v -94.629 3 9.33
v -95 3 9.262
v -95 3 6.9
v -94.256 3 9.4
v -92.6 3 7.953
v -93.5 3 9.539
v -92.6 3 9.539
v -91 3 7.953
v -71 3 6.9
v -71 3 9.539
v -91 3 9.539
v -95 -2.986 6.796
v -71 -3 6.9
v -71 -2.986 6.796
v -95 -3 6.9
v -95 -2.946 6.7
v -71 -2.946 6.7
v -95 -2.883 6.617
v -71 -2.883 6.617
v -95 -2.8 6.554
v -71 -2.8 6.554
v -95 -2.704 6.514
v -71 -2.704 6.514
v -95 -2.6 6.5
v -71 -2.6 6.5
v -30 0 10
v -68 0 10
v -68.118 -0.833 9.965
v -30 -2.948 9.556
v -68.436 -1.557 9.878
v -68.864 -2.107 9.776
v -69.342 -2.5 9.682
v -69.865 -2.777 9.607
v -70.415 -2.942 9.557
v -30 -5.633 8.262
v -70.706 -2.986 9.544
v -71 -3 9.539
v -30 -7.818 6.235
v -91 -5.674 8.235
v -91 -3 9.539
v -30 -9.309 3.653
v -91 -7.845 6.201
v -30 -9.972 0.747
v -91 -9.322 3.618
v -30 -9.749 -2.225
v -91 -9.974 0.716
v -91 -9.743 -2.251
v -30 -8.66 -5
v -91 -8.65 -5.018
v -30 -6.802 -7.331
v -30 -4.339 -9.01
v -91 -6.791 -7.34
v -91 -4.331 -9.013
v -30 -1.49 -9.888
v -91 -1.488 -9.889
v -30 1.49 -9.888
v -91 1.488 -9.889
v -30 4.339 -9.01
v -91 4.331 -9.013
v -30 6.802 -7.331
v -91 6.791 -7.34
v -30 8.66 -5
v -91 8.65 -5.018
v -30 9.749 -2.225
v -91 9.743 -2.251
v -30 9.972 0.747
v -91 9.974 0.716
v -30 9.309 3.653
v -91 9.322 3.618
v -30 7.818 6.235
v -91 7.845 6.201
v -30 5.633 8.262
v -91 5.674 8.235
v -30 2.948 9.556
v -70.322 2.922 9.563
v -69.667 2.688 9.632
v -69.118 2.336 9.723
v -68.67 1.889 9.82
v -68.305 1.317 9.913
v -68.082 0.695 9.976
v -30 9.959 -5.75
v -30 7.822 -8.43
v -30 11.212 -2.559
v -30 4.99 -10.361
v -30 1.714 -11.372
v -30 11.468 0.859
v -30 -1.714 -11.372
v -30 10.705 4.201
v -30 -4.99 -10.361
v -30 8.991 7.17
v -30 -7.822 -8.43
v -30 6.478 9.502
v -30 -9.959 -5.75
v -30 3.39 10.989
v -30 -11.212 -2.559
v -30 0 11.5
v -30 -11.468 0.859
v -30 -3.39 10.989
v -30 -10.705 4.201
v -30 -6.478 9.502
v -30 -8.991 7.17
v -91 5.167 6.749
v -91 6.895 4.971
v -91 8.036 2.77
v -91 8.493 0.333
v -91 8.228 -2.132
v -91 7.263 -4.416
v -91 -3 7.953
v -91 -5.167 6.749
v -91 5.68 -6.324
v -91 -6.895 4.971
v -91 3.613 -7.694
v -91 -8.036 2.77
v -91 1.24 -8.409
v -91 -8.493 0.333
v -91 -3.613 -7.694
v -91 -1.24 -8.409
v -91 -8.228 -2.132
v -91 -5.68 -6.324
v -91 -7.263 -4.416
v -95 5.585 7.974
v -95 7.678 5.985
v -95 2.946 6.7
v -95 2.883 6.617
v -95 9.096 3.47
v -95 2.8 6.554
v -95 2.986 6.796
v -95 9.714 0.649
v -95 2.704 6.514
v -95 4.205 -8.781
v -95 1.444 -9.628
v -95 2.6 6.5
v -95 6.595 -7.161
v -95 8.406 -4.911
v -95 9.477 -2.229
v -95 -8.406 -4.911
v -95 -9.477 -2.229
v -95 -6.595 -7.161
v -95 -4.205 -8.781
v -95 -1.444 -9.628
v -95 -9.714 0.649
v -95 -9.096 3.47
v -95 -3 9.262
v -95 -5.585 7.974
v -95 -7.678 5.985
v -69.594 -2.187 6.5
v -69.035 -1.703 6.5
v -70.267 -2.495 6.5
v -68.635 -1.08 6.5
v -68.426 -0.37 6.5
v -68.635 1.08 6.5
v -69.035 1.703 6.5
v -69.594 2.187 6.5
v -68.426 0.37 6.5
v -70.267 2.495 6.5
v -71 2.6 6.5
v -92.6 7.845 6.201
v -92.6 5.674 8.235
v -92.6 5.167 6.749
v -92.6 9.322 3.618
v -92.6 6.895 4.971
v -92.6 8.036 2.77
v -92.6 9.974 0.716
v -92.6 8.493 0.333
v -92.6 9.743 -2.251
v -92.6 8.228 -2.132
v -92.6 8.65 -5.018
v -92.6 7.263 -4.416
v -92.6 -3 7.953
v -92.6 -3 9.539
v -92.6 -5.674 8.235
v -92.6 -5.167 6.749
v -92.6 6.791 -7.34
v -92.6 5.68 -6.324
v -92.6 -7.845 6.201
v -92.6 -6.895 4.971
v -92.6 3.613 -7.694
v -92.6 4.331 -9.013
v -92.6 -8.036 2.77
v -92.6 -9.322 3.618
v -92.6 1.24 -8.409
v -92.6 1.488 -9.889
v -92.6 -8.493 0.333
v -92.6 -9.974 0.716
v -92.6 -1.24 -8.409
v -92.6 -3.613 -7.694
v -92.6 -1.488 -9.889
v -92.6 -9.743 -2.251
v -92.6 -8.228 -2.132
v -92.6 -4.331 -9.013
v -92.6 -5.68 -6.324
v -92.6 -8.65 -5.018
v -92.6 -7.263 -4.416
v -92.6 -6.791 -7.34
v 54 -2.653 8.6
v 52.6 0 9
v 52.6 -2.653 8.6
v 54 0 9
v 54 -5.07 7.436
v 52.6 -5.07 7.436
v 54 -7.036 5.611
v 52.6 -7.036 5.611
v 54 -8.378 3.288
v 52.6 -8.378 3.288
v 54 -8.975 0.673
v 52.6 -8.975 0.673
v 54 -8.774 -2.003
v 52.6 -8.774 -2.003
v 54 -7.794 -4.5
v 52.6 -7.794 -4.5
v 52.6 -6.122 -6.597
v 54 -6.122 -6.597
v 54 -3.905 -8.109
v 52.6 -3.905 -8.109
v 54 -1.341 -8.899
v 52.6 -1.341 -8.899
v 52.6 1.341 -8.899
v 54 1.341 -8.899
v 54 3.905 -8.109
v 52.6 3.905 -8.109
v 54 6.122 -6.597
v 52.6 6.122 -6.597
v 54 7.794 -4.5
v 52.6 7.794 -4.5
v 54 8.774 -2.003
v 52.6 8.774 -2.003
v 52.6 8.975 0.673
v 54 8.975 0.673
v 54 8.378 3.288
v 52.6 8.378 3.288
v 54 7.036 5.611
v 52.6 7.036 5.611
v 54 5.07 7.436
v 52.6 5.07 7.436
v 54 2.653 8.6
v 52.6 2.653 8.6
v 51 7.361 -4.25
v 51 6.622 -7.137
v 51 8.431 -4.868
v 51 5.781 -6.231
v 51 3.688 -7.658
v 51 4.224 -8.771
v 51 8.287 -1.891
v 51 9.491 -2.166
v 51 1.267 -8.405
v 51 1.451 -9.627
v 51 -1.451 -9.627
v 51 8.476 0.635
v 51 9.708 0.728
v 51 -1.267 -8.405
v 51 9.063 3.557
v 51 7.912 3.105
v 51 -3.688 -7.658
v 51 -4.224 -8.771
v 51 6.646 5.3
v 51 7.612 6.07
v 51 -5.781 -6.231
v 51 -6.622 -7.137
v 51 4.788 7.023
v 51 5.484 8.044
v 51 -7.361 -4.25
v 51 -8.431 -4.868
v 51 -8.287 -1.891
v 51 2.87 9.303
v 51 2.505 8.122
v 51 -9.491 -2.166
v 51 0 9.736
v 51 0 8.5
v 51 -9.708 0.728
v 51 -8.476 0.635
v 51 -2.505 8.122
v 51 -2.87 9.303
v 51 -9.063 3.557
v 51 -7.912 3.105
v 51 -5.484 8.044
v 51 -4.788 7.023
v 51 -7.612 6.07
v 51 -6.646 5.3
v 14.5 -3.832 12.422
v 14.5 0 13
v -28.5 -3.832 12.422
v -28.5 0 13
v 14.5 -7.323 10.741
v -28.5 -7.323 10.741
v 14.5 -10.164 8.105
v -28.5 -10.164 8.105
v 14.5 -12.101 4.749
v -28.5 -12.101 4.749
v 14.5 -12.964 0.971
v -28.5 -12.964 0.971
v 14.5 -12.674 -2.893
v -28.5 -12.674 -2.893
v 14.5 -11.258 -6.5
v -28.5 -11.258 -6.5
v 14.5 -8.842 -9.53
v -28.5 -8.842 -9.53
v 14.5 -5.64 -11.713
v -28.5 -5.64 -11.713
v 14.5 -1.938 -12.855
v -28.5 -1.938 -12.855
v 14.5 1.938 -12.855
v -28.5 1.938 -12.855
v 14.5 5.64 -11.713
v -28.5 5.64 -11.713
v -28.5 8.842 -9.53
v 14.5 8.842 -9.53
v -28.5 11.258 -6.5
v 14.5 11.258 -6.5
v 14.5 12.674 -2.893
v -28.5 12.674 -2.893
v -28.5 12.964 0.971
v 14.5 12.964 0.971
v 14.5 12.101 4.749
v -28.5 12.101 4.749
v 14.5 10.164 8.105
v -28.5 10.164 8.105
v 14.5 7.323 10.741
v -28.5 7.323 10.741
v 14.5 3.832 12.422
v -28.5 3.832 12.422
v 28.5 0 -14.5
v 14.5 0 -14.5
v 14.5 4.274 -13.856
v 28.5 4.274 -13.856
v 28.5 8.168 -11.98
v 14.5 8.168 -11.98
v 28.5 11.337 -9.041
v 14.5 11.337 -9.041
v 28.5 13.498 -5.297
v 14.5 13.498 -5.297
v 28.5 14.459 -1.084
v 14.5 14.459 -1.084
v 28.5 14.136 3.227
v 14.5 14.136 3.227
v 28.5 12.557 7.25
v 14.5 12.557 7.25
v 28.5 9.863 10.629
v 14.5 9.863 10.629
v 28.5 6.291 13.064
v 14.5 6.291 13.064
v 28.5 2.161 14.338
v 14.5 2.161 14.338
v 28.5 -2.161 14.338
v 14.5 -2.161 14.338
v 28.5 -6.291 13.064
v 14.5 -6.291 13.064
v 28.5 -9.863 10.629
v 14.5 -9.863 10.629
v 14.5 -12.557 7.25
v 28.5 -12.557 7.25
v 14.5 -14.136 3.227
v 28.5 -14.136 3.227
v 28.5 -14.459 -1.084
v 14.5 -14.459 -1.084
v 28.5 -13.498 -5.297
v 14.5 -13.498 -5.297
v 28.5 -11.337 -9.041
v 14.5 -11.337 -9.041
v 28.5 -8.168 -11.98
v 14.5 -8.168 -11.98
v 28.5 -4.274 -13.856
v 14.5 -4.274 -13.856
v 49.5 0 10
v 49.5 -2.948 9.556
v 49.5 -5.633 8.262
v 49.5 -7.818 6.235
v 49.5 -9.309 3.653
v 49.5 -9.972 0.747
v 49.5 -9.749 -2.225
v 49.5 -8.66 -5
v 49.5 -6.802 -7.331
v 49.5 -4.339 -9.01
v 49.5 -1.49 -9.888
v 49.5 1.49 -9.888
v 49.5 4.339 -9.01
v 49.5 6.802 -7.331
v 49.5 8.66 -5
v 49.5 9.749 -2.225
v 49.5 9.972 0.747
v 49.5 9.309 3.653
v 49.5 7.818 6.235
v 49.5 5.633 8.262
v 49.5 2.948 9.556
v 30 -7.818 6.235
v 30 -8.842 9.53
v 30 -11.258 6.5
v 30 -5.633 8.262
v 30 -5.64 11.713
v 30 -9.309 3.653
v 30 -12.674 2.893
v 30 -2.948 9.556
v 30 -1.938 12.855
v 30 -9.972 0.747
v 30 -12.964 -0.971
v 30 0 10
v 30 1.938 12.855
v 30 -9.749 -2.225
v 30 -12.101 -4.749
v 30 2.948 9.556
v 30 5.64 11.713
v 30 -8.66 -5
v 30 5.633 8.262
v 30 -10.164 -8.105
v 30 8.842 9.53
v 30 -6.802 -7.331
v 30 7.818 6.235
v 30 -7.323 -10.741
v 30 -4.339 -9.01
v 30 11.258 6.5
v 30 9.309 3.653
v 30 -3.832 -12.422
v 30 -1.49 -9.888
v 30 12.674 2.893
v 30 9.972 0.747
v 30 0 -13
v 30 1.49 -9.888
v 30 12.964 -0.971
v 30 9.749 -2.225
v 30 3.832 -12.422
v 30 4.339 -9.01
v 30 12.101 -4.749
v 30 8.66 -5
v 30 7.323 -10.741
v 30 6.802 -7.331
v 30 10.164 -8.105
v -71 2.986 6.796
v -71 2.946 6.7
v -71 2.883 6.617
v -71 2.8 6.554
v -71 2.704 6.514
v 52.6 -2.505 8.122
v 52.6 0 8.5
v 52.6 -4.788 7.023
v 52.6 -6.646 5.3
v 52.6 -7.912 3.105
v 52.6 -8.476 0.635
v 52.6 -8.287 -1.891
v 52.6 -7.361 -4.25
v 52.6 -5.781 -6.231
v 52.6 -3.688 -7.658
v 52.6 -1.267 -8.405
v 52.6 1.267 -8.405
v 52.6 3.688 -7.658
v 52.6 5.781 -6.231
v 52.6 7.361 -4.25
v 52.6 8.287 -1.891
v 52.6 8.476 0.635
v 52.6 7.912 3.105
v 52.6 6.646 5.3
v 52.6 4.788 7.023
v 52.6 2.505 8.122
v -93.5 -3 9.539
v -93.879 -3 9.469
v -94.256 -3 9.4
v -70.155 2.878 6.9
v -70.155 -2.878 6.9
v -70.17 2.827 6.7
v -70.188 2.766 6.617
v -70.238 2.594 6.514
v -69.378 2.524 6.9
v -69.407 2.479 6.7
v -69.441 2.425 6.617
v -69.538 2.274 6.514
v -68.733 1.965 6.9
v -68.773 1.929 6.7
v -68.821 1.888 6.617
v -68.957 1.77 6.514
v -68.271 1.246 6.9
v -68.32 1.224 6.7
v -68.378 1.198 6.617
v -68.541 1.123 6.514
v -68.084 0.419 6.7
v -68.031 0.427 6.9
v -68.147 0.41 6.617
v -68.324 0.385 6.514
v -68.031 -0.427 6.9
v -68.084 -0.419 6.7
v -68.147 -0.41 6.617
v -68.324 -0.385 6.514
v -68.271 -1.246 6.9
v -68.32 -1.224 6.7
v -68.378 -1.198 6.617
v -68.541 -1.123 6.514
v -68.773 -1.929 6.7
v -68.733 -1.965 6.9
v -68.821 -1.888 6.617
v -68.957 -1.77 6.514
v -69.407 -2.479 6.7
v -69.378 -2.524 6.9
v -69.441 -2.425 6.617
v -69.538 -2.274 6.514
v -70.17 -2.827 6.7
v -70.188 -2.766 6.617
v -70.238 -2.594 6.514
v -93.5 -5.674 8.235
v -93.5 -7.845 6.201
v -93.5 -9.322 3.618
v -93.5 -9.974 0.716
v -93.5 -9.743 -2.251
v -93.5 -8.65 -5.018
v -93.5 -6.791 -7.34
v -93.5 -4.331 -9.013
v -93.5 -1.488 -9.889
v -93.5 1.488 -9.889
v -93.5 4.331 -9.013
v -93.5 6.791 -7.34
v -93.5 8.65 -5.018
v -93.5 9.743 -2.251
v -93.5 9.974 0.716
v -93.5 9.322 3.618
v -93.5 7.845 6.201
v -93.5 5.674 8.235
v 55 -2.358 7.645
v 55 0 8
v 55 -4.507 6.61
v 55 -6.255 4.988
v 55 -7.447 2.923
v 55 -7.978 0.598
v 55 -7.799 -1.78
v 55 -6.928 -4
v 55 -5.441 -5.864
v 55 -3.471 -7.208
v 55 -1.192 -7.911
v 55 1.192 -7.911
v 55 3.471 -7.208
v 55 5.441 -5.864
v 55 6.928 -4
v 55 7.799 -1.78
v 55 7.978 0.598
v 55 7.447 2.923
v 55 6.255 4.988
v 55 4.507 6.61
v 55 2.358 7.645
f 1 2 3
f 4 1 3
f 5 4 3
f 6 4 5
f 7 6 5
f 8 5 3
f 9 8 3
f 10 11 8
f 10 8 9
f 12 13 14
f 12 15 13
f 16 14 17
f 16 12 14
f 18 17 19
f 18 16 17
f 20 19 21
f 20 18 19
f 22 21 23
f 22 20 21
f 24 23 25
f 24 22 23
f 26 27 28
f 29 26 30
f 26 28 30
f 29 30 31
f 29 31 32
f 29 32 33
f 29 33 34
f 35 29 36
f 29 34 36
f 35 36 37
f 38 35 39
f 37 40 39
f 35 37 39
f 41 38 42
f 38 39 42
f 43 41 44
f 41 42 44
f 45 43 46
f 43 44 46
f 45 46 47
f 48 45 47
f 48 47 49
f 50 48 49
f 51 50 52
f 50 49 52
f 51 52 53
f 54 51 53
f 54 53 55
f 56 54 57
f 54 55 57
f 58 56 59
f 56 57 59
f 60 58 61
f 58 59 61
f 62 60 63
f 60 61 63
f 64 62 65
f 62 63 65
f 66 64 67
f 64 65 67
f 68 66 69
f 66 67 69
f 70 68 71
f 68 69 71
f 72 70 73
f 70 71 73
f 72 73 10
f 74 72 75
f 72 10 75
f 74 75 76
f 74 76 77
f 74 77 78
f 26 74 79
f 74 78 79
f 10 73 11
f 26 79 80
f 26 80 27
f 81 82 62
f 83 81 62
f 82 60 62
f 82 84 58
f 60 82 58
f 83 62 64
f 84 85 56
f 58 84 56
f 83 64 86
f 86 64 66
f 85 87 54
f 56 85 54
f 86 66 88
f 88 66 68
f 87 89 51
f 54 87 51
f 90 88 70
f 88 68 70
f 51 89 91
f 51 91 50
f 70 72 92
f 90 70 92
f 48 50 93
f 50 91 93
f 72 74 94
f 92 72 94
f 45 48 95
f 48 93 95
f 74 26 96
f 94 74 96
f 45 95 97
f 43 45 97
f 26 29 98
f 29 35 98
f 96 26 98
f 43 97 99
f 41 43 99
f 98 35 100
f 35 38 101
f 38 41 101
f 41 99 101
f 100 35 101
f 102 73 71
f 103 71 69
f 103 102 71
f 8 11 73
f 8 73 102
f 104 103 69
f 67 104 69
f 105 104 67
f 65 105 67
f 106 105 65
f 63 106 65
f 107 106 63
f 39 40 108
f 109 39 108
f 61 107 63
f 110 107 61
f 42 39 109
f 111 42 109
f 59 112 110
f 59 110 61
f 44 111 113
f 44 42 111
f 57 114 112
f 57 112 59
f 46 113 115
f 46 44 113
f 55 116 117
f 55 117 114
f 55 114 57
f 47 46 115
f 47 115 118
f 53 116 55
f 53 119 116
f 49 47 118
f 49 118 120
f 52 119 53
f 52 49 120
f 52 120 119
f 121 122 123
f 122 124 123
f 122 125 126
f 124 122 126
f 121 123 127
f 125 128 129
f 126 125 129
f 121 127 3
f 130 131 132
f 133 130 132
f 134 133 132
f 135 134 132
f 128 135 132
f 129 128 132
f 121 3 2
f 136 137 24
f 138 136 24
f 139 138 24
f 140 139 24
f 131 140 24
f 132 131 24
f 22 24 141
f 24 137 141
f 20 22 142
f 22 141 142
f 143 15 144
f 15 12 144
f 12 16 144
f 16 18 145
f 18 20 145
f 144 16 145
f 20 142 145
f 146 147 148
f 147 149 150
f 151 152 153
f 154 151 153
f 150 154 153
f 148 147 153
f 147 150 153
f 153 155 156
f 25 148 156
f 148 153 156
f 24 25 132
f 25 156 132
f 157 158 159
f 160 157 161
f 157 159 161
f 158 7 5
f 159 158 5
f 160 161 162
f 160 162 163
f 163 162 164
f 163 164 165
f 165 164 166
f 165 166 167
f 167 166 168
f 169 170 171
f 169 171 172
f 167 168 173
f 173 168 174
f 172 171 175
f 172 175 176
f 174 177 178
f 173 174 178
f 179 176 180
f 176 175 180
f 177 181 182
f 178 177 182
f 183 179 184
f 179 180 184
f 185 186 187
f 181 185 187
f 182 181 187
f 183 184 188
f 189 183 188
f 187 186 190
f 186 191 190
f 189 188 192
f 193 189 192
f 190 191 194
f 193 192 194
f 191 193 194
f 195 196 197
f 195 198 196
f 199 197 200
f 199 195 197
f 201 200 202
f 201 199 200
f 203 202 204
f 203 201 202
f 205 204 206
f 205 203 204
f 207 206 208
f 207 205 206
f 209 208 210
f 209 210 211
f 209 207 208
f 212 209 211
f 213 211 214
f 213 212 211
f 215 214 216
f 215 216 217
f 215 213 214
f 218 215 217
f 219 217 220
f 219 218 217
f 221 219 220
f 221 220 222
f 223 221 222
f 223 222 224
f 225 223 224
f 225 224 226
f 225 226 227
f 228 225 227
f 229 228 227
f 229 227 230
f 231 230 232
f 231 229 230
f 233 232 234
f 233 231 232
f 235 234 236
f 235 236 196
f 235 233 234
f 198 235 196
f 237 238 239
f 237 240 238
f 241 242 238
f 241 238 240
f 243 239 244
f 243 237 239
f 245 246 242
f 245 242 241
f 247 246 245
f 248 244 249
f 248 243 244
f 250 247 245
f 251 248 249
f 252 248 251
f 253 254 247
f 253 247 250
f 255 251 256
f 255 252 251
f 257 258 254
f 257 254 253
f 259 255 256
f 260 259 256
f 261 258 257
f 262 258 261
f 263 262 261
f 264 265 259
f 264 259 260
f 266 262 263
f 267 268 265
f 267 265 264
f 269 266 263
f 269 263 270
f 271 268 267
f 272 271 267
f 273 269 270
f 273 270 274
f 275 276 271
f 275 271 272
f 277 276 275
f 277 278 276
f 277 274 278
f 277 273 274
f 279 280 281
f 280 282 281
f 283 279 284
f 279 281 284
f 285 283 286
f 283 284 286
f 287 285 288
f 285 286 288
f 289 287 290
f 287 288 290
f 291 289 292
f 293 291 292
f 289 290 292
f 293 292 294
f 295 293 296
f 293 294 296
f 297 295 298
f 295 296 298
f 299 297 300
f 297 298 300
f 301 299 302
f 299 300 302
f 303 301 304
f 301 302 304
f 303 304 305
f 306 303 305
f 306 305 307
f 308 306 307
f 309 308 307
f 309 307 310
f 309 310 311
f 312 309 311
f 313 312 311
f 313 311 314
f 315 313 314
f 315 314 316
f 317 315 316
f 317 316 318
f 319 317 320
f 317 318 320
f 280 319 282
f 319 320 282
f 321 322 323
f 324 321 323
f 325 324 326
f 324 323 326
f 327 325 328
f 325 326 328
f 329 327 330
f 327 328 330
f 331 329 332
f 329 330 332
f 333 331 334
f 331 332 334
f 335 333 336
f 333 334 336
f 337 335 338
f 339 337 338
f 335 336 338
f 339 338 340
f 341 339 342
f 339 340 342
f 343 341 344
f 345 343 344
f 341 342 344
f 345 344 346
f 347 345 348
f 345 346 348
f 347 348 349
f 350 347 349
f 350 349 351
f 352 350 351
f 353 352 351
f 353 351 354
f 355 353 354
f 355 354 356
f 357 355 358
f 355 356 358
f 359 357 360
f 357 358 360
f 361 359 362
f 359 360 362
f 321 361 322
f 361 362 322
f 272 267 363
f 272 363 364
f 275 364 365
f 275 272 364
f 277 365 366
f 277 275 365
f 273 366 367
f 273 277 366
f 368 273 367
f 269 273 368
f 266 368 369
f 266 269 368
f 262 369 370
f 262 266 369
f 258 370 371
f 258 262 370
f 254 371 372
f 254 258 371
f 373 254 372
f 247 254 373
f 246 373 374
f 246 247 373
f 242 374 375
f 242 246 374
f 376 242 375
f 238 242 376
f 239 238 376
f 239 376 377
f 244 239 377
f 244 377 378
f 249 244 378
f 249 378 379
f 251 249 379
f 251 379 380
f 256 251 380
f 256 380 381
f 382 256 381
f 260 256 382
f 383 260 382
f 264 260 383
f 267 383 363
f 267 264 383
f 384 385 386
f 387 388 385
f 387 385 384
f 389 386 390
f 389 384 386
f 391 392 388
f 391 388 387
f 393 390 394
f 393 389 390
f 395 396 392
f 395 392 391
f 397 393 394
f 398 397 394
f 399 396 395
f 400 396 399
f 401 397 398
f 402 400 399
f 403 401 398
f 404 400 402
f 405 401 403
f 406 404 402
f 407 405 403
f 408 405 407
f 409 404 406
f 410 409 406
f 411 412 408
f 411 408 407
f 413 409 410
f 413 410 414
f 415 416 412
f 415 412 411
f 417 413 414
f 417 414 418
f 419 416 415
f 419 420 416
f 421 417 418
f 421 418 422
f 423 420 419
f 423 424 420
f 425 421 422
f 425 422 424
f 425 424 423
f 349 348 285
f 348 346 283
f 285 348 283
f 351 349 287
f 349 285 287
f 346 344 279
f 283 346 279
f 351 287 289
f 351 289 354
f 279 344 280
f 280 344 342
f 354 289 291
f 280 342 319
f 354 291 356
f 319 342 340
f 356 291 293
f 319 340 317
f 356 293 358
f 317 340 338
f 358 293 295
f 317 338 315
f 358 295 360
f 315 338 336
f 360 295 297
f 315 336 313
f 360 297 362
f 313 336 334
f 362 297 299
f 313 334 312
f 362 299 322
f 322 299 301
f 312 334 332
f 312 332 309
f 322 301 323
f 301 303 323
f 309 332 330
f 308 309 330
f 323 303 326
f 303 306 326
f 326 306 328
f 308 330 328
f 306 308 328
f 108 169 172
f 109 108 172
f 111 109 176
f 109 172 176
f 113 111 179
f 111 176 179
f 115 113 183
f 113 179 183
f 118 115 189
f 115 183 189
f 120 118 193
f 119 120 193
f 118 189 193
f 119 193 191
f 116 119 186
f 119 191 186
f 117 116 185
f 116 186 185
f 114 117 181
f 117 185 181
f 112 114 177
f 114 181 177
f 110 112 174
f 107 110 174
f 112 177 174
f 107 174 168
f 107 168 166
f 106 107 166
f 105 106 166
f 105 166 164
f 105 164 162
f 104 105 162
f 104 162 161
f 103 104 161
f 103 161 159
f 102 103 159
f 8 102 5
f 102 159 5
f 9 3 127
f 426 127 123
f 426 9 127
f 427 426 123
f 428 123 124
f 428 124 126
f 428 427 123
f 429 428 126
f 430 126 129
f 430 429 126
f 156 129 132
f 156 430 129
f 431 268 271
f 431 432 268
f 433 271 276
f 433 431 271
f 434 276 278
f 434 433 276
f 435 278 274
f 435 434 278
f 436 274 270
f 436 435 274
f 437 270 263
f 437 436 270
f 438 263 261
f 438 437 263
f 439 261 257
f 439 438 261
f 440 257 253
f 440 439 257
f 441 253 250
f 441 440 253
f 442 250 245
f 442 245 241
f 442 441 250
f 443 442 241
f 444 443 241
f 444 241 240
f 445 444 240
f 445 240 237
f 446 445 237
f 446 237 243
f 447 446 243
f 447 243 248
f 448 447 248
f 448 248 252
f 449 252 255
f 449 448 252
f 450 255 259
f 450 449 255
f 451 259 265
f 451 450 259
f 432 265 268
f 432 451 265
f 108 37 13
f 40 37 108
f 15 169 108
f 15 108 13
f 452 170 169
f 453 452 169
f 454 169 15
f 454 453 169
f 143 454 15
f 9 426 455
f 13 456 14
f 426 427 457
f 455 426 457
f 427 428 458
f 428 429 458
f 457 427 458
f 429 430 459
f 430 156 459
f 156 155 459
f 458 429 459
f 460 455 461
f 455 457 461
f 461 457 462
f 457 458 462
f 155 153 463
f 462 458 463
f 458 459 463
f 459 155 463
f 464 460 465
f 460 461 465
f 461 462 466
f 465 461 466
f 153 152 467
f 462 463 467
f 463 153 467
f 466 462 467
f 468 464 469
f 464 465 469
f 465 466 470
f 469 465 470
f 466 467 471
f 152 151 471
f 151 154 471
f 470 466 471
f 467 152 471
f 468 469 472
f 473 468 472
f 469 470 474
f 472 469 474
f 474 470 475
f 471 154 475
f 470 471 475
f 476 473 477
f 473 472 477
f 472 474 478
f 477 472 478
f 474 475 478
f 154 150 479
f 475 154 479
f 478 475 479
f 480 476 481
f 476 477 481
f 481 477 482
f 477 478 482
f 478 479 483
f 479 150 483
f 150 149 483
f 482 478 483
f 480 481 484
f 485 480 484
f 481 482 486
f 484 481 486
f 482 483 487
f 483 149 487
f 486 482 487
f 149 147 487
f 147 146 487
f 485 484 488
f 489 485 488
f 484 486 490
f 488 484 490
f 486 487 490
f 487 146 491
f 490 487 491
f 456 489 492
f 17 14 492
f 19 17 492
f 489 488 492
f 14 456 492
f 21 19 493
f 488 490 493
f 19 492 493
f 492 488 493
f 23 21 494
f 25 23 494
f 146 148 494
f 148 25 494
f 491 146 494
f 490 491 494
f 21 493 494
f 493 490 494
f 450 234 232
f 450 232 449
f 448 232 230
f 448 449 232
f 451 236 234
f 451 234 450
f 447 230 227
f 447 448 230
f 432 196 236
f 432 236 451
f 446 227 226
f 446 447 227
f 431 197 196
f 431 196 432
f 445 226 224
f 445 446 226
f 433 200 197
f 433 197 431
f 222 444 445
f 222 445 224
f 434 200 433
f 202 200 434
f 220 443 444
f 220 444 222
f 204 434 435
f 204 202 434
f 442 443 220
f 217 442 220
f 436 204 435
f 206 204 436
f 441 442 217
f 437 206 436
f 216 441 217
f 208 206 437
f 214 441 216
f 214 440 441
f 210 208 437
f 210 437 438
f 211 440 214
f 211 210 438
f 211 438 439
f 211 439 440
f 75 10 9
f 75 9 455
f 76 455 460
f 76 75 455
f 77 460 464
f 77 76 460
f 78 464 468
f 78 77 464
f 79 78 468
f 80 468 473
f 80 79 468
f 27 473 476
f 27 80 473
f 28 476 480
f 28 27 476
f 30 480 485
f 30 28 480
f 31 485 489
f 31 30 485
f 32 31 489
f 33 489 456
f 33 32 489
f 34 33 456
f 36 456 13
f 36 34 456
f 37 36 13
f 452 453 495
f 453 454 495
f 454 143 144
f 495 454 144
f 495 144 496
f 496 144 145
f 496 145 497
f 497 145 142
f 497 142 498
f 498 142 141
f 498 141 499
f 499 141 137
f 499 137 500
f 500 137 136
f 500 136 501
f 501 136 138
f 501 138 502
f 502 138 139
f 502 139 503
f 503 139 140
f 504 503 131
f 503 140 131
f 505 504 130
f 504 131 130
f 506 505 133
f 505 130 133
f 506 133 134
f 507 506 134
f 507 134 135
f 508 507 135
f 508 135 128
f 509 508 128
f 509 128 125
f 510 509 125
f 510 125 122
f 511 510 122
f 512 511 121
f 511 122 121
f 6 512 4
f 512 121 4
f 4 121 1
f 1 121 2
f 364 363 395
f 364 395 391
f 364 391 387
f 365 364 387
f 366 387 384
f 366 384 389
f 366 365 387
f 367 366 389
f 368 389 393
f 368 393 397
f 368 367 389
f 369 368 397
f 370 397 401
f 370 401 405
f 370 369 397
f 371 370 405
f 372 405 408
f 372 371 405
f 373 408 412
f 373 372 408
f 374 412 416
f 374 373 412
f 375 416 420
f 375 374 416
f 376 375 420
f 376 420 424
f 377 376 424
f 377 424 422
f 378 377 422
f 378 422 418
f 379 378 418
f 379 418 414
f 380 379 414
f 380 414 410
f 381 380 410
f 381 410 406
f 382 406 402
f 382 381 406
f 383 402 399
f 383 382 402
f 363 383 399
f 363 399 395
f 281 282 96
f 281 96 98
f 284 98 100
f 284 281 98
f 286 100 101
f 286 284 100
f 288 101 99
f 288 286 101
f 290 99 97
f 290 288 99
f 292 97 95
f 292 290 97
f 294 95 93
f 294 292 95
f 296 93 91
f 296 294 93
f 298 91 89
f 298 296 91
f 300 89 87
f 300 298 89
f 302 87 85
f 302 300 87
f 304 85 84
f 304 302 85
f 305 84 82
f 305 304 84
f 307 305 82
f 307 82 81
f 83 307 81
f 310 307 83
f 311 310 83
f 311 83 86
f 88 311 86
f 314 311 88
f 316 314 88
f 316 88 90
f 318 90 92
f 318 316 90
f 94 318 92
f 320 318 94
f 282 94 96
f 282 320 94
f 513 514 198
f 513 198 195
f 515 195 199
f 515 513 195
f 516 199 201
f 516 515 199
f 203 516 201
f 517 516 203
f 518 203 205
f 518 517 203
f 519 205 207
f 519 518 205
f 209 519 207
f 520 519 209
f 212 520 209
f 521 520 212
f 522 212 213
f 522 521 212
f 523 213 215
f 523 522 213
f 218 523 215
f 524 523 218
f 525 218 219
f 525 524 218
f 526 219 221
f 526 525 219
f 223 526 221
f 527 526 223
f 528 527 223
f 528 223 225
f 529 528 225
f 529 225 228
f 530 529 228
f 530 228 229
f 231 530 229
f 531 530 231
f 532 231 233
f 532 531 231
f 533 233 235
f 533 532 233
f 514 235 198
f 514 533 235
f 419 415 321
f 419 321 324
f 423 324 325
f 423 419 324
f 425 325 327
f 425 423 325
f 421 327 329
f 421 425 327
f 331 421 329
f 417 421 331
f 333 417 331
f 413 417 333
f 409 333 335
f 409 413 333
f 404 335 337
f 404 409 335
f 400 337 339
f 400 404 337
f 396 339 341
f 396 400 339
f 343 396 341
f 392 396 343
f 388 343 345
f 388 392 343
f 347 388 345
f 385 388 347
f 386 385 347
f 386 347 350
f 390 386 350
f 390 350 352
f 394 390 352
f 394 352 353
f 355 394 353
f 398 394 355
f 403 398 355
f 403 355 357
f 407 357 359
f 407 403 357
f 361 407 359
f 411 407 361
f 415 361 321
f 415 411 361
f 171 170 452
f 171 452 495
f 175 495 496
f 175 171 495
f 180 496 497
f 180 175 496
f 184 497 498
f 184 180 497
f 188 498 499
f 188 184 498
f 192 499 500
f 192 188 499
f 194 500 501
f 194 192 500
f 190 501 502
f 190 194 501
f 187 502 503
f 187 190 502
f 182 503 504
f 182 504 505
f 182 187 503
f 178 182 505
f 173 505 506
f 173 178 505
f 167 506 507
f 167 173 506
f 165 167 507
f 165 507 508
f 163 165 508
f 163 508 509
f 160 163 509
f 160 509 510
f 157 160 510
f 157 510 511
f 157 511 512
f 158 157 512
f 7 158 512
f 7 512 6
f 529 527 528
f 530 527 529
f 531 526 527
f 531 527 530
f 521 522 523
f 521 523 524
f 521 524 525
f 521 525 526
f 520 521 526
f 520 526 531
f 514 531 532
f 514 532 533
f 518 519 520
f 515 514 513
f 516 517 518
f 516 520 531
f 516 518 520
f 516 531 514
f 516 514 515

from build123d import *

# Parameters (mm, degrees)
CHAMFER_1_SIZE              = 1.5
CHAMFER_1_SIZE2             = 0.264490471
CHAMFER_2_SIZE              = 1
SKETCH_2_W                  = 1.6
SKETCH_2_H                  = 2.408745076
SKETCH_6_R                  = 10
EXTRUDE_2_DEPTH             = 42.4
EXTRUDE_2_DIRECTION_2_REACH = 111.159
CHAMFER_5_SIZE              = 1.5
CHAMFER_5_SIZE2             = 0.264490471
CUT_EXTRUDE_2_DEPTH         = 3.5
CHAMFER_6_SIZE              = 1.5
EXTRUDE_START               = -15.5
SKETCH_9_R                  = 14.5
SKETCH_9_R_2                = 13
EXTRUDE_3_DEPTH             = 15.5
CHAMFER_7_SIZE              = 1.5
FILLET_1_R                  = 0.4


with BuildPart() as part:
    # Эскиз1 → Повернуть1 (revolve)
    with BuildSketch(Plane.XY, mode=Mode.PRIVATE) as revolve_1_sk:
        Polygon((0, 0), (0, 13), (30, 13), (30, 10), (51, 10), (51, 9), (55, 9), (55, 0), align=None)
    revolve(revolve_1_sk.sketch.rotate(Axis((0, 0, 0), (1, 0, 0)), 90), axis=Axis((0, 0, 0), (1, 0, 0)))

    # Зеркальное отражение1: part across plane


with BuildPart() as part_1:
    add(part.part)
    add(part.part.mirror(Plane(origin=(0, 0, 0), x_dir=(0, 0, 1), z_dir=(1, 0, 0))))

    # Фаска1
    chamfer_1_edges = [part_1.edges().sort_by_distance(p)[0] for p in [
        (51, 0, -10),
    ]]
    chamfer_1_side = [part_1.faces().sort_by_distance(p)[0] for p in [
        (40.5, 0, -10),
    ]]
    chamfer(chamfer_1_edges, length=CHAMFER_1_SIZE, length2=CHAMFER_1_SIZE2, reference=chamfer_1_side[0])

    # Фаска2
    chamfer_2_edges = [part_1.edges().sort_by_distance(p)[0] for p in [
        (55, 0, -9),
    ]]
    chamfer(chamfer_2_edges, length=CHAMFER_2_SIZE)

    # Эскиз2 → Вырез-Повернуть1 (revolve, cut)
    with BuildSketch(Plane(origin=(0, 0, 0), x_dir=(1, 0, 0), z_dir=(0, 1, 0)), mode=Mode.PRIVATE) as cut_revolve_1_sk:
        with Locations((51.8, 9.704372538)):
            Rectangle(SKETCH_2_W, SKETCH_2_H)
    cut_revolve_1 = revolve(cut_revolve_1_sk.sketch.rotate(Axis((0, 0, 0), (1, 0, 0)), 180), axis=Axis((0, 0, 0), (1, 0, 0)), mode=Mode.SUBTRACT)

    # Зеркальное отражение2: Вырез-Повернуть1 across plane
    add(cut_revolve_1.mirror(Plane(origin=(0, 0, 0), x_dir=(0, 0, 1), z_dir=(1, 0, 0))), mode=Mode.SUBTRACT)

    # Эскиз6 → Бобышка-Вытянуть2 (add)
    with BuildSketch(Plane(origin=(-52.6, 0, 0), x_dir=(0, 0, -1), z_dir=(1, 0, 0))):
        with Locations(Location((0, 0, 0), (0, 0, 180))):
            Circle(SKETCH_6_R)
    extrude(amount=-EXTRUDE_2_DEPTH)

    # Эскиз6 → Бобышка-Вытянуть2 direction 2 (add, up to next)
    with BuildSketch(Plane(origin=(-52.6, 0, 0), x_dir=(0, 0, -1), z_dir=(1, 0, 0)), mode=Mode.PRIVATE) as extrude_2_direction_2_sk1:
        with Locations(Location((0, 0, 0), (0, 0, 180))):
            Circle(SKETCH_6_R)
    extrude_2_direction_2_tool1 = extrude(extrude_2_direction_2_sk1.sketch, amount=EXTRUDE_2_DIRECTION_2_REACH, mode=Mode.PRIVATE) - part_1.part
    add(extrude_2_direction_2_tool1.solids().sort_by_distance((-52.6, 0, 0))[0])

    # Фаска5
    chamfer_5_edges = [part_1.edges().sort_by_distance(p)[0] for p in [
        (-95, 0, -10),
    ]]
    chamfer_5_side = [part_1.faces().sort_by_distance(p)[0] for p in [
        (-73.8, 0, -10),
    ]]
    chamfer(chamfer_5_edges, length=CHAMFER_5_SIZE, length2=CHAMFER_5_SIZE2, reference=chamfer_5_side[0])

    # Зеркальное отражение5: Вырез-Повернуть1 across plane
    add(cut_revolve_1.mirror(Plane(origin=(-20, 0, 0), x_dir=(0, 0, 1), z_dir=(1, 0, 0))), mode=Mode.SUBTRACT)

    # Эскиз8 → Вырез-Вытянуть2 (cut)
    with BuildSketch(Plane.XY.offset(10)):
        with BuildLine():
            Line((-119, 3), (-71, 3))
            ThreePointArc((-71, 3), (-68, 0), (-71, -3))
            Line((-71, -3), (-119, -3))
            ThreePointArc((-119, -3), (-122, 0), (-119, 3))
        make_face()
    extrude(amount=-CUT_EXTRUDE_2_DEPTH, mode=Mode.SUBTRACT)

    # Фаска6
    chamfer_6_edges = [part_1.edges().sort_by_distance(p)[0] for p in [
        (-30, 0, -13),
    ]]
    chamfer(chamfer_6_edges, length=CHAMFER_6_SIZE)

    # Эскиз9 → Бобышка-Вытянуть3 (add)
    with BuildSketch(Plane(origin=(30, 0, 0), x_dir=(0, 0, -1), z_dir=(1, 0, 0)).offset(EXTRUDE_START)):
        Circle(SKETCH_9_R)
        Circle(SKETCH_9_R_2, mode=Mode.SUBTRACT)
    extrude(amount=EXTRUDE_3_DEPTH)

    # Фаска7
    chamfer_7_edges = [part_1.edges().sort_by_distance(p)[0] for p in [
        (30, 0, 14.5),
    ]]
    chamfer(chamfer_7_edges, length=CHAMFER_7_SIZE)

    # Скругление1
    fillet_1_edges = [part_1.edges().sort_by_distance(p)[0] for p in [
        (-68, 0, 6.5),
        (-83, 3, 6.5),
        (-83, -3, 6.5),
    ]]
    fillet(fillet_1_edges, radius=FILLET_1_R)


solid = part_1.part
